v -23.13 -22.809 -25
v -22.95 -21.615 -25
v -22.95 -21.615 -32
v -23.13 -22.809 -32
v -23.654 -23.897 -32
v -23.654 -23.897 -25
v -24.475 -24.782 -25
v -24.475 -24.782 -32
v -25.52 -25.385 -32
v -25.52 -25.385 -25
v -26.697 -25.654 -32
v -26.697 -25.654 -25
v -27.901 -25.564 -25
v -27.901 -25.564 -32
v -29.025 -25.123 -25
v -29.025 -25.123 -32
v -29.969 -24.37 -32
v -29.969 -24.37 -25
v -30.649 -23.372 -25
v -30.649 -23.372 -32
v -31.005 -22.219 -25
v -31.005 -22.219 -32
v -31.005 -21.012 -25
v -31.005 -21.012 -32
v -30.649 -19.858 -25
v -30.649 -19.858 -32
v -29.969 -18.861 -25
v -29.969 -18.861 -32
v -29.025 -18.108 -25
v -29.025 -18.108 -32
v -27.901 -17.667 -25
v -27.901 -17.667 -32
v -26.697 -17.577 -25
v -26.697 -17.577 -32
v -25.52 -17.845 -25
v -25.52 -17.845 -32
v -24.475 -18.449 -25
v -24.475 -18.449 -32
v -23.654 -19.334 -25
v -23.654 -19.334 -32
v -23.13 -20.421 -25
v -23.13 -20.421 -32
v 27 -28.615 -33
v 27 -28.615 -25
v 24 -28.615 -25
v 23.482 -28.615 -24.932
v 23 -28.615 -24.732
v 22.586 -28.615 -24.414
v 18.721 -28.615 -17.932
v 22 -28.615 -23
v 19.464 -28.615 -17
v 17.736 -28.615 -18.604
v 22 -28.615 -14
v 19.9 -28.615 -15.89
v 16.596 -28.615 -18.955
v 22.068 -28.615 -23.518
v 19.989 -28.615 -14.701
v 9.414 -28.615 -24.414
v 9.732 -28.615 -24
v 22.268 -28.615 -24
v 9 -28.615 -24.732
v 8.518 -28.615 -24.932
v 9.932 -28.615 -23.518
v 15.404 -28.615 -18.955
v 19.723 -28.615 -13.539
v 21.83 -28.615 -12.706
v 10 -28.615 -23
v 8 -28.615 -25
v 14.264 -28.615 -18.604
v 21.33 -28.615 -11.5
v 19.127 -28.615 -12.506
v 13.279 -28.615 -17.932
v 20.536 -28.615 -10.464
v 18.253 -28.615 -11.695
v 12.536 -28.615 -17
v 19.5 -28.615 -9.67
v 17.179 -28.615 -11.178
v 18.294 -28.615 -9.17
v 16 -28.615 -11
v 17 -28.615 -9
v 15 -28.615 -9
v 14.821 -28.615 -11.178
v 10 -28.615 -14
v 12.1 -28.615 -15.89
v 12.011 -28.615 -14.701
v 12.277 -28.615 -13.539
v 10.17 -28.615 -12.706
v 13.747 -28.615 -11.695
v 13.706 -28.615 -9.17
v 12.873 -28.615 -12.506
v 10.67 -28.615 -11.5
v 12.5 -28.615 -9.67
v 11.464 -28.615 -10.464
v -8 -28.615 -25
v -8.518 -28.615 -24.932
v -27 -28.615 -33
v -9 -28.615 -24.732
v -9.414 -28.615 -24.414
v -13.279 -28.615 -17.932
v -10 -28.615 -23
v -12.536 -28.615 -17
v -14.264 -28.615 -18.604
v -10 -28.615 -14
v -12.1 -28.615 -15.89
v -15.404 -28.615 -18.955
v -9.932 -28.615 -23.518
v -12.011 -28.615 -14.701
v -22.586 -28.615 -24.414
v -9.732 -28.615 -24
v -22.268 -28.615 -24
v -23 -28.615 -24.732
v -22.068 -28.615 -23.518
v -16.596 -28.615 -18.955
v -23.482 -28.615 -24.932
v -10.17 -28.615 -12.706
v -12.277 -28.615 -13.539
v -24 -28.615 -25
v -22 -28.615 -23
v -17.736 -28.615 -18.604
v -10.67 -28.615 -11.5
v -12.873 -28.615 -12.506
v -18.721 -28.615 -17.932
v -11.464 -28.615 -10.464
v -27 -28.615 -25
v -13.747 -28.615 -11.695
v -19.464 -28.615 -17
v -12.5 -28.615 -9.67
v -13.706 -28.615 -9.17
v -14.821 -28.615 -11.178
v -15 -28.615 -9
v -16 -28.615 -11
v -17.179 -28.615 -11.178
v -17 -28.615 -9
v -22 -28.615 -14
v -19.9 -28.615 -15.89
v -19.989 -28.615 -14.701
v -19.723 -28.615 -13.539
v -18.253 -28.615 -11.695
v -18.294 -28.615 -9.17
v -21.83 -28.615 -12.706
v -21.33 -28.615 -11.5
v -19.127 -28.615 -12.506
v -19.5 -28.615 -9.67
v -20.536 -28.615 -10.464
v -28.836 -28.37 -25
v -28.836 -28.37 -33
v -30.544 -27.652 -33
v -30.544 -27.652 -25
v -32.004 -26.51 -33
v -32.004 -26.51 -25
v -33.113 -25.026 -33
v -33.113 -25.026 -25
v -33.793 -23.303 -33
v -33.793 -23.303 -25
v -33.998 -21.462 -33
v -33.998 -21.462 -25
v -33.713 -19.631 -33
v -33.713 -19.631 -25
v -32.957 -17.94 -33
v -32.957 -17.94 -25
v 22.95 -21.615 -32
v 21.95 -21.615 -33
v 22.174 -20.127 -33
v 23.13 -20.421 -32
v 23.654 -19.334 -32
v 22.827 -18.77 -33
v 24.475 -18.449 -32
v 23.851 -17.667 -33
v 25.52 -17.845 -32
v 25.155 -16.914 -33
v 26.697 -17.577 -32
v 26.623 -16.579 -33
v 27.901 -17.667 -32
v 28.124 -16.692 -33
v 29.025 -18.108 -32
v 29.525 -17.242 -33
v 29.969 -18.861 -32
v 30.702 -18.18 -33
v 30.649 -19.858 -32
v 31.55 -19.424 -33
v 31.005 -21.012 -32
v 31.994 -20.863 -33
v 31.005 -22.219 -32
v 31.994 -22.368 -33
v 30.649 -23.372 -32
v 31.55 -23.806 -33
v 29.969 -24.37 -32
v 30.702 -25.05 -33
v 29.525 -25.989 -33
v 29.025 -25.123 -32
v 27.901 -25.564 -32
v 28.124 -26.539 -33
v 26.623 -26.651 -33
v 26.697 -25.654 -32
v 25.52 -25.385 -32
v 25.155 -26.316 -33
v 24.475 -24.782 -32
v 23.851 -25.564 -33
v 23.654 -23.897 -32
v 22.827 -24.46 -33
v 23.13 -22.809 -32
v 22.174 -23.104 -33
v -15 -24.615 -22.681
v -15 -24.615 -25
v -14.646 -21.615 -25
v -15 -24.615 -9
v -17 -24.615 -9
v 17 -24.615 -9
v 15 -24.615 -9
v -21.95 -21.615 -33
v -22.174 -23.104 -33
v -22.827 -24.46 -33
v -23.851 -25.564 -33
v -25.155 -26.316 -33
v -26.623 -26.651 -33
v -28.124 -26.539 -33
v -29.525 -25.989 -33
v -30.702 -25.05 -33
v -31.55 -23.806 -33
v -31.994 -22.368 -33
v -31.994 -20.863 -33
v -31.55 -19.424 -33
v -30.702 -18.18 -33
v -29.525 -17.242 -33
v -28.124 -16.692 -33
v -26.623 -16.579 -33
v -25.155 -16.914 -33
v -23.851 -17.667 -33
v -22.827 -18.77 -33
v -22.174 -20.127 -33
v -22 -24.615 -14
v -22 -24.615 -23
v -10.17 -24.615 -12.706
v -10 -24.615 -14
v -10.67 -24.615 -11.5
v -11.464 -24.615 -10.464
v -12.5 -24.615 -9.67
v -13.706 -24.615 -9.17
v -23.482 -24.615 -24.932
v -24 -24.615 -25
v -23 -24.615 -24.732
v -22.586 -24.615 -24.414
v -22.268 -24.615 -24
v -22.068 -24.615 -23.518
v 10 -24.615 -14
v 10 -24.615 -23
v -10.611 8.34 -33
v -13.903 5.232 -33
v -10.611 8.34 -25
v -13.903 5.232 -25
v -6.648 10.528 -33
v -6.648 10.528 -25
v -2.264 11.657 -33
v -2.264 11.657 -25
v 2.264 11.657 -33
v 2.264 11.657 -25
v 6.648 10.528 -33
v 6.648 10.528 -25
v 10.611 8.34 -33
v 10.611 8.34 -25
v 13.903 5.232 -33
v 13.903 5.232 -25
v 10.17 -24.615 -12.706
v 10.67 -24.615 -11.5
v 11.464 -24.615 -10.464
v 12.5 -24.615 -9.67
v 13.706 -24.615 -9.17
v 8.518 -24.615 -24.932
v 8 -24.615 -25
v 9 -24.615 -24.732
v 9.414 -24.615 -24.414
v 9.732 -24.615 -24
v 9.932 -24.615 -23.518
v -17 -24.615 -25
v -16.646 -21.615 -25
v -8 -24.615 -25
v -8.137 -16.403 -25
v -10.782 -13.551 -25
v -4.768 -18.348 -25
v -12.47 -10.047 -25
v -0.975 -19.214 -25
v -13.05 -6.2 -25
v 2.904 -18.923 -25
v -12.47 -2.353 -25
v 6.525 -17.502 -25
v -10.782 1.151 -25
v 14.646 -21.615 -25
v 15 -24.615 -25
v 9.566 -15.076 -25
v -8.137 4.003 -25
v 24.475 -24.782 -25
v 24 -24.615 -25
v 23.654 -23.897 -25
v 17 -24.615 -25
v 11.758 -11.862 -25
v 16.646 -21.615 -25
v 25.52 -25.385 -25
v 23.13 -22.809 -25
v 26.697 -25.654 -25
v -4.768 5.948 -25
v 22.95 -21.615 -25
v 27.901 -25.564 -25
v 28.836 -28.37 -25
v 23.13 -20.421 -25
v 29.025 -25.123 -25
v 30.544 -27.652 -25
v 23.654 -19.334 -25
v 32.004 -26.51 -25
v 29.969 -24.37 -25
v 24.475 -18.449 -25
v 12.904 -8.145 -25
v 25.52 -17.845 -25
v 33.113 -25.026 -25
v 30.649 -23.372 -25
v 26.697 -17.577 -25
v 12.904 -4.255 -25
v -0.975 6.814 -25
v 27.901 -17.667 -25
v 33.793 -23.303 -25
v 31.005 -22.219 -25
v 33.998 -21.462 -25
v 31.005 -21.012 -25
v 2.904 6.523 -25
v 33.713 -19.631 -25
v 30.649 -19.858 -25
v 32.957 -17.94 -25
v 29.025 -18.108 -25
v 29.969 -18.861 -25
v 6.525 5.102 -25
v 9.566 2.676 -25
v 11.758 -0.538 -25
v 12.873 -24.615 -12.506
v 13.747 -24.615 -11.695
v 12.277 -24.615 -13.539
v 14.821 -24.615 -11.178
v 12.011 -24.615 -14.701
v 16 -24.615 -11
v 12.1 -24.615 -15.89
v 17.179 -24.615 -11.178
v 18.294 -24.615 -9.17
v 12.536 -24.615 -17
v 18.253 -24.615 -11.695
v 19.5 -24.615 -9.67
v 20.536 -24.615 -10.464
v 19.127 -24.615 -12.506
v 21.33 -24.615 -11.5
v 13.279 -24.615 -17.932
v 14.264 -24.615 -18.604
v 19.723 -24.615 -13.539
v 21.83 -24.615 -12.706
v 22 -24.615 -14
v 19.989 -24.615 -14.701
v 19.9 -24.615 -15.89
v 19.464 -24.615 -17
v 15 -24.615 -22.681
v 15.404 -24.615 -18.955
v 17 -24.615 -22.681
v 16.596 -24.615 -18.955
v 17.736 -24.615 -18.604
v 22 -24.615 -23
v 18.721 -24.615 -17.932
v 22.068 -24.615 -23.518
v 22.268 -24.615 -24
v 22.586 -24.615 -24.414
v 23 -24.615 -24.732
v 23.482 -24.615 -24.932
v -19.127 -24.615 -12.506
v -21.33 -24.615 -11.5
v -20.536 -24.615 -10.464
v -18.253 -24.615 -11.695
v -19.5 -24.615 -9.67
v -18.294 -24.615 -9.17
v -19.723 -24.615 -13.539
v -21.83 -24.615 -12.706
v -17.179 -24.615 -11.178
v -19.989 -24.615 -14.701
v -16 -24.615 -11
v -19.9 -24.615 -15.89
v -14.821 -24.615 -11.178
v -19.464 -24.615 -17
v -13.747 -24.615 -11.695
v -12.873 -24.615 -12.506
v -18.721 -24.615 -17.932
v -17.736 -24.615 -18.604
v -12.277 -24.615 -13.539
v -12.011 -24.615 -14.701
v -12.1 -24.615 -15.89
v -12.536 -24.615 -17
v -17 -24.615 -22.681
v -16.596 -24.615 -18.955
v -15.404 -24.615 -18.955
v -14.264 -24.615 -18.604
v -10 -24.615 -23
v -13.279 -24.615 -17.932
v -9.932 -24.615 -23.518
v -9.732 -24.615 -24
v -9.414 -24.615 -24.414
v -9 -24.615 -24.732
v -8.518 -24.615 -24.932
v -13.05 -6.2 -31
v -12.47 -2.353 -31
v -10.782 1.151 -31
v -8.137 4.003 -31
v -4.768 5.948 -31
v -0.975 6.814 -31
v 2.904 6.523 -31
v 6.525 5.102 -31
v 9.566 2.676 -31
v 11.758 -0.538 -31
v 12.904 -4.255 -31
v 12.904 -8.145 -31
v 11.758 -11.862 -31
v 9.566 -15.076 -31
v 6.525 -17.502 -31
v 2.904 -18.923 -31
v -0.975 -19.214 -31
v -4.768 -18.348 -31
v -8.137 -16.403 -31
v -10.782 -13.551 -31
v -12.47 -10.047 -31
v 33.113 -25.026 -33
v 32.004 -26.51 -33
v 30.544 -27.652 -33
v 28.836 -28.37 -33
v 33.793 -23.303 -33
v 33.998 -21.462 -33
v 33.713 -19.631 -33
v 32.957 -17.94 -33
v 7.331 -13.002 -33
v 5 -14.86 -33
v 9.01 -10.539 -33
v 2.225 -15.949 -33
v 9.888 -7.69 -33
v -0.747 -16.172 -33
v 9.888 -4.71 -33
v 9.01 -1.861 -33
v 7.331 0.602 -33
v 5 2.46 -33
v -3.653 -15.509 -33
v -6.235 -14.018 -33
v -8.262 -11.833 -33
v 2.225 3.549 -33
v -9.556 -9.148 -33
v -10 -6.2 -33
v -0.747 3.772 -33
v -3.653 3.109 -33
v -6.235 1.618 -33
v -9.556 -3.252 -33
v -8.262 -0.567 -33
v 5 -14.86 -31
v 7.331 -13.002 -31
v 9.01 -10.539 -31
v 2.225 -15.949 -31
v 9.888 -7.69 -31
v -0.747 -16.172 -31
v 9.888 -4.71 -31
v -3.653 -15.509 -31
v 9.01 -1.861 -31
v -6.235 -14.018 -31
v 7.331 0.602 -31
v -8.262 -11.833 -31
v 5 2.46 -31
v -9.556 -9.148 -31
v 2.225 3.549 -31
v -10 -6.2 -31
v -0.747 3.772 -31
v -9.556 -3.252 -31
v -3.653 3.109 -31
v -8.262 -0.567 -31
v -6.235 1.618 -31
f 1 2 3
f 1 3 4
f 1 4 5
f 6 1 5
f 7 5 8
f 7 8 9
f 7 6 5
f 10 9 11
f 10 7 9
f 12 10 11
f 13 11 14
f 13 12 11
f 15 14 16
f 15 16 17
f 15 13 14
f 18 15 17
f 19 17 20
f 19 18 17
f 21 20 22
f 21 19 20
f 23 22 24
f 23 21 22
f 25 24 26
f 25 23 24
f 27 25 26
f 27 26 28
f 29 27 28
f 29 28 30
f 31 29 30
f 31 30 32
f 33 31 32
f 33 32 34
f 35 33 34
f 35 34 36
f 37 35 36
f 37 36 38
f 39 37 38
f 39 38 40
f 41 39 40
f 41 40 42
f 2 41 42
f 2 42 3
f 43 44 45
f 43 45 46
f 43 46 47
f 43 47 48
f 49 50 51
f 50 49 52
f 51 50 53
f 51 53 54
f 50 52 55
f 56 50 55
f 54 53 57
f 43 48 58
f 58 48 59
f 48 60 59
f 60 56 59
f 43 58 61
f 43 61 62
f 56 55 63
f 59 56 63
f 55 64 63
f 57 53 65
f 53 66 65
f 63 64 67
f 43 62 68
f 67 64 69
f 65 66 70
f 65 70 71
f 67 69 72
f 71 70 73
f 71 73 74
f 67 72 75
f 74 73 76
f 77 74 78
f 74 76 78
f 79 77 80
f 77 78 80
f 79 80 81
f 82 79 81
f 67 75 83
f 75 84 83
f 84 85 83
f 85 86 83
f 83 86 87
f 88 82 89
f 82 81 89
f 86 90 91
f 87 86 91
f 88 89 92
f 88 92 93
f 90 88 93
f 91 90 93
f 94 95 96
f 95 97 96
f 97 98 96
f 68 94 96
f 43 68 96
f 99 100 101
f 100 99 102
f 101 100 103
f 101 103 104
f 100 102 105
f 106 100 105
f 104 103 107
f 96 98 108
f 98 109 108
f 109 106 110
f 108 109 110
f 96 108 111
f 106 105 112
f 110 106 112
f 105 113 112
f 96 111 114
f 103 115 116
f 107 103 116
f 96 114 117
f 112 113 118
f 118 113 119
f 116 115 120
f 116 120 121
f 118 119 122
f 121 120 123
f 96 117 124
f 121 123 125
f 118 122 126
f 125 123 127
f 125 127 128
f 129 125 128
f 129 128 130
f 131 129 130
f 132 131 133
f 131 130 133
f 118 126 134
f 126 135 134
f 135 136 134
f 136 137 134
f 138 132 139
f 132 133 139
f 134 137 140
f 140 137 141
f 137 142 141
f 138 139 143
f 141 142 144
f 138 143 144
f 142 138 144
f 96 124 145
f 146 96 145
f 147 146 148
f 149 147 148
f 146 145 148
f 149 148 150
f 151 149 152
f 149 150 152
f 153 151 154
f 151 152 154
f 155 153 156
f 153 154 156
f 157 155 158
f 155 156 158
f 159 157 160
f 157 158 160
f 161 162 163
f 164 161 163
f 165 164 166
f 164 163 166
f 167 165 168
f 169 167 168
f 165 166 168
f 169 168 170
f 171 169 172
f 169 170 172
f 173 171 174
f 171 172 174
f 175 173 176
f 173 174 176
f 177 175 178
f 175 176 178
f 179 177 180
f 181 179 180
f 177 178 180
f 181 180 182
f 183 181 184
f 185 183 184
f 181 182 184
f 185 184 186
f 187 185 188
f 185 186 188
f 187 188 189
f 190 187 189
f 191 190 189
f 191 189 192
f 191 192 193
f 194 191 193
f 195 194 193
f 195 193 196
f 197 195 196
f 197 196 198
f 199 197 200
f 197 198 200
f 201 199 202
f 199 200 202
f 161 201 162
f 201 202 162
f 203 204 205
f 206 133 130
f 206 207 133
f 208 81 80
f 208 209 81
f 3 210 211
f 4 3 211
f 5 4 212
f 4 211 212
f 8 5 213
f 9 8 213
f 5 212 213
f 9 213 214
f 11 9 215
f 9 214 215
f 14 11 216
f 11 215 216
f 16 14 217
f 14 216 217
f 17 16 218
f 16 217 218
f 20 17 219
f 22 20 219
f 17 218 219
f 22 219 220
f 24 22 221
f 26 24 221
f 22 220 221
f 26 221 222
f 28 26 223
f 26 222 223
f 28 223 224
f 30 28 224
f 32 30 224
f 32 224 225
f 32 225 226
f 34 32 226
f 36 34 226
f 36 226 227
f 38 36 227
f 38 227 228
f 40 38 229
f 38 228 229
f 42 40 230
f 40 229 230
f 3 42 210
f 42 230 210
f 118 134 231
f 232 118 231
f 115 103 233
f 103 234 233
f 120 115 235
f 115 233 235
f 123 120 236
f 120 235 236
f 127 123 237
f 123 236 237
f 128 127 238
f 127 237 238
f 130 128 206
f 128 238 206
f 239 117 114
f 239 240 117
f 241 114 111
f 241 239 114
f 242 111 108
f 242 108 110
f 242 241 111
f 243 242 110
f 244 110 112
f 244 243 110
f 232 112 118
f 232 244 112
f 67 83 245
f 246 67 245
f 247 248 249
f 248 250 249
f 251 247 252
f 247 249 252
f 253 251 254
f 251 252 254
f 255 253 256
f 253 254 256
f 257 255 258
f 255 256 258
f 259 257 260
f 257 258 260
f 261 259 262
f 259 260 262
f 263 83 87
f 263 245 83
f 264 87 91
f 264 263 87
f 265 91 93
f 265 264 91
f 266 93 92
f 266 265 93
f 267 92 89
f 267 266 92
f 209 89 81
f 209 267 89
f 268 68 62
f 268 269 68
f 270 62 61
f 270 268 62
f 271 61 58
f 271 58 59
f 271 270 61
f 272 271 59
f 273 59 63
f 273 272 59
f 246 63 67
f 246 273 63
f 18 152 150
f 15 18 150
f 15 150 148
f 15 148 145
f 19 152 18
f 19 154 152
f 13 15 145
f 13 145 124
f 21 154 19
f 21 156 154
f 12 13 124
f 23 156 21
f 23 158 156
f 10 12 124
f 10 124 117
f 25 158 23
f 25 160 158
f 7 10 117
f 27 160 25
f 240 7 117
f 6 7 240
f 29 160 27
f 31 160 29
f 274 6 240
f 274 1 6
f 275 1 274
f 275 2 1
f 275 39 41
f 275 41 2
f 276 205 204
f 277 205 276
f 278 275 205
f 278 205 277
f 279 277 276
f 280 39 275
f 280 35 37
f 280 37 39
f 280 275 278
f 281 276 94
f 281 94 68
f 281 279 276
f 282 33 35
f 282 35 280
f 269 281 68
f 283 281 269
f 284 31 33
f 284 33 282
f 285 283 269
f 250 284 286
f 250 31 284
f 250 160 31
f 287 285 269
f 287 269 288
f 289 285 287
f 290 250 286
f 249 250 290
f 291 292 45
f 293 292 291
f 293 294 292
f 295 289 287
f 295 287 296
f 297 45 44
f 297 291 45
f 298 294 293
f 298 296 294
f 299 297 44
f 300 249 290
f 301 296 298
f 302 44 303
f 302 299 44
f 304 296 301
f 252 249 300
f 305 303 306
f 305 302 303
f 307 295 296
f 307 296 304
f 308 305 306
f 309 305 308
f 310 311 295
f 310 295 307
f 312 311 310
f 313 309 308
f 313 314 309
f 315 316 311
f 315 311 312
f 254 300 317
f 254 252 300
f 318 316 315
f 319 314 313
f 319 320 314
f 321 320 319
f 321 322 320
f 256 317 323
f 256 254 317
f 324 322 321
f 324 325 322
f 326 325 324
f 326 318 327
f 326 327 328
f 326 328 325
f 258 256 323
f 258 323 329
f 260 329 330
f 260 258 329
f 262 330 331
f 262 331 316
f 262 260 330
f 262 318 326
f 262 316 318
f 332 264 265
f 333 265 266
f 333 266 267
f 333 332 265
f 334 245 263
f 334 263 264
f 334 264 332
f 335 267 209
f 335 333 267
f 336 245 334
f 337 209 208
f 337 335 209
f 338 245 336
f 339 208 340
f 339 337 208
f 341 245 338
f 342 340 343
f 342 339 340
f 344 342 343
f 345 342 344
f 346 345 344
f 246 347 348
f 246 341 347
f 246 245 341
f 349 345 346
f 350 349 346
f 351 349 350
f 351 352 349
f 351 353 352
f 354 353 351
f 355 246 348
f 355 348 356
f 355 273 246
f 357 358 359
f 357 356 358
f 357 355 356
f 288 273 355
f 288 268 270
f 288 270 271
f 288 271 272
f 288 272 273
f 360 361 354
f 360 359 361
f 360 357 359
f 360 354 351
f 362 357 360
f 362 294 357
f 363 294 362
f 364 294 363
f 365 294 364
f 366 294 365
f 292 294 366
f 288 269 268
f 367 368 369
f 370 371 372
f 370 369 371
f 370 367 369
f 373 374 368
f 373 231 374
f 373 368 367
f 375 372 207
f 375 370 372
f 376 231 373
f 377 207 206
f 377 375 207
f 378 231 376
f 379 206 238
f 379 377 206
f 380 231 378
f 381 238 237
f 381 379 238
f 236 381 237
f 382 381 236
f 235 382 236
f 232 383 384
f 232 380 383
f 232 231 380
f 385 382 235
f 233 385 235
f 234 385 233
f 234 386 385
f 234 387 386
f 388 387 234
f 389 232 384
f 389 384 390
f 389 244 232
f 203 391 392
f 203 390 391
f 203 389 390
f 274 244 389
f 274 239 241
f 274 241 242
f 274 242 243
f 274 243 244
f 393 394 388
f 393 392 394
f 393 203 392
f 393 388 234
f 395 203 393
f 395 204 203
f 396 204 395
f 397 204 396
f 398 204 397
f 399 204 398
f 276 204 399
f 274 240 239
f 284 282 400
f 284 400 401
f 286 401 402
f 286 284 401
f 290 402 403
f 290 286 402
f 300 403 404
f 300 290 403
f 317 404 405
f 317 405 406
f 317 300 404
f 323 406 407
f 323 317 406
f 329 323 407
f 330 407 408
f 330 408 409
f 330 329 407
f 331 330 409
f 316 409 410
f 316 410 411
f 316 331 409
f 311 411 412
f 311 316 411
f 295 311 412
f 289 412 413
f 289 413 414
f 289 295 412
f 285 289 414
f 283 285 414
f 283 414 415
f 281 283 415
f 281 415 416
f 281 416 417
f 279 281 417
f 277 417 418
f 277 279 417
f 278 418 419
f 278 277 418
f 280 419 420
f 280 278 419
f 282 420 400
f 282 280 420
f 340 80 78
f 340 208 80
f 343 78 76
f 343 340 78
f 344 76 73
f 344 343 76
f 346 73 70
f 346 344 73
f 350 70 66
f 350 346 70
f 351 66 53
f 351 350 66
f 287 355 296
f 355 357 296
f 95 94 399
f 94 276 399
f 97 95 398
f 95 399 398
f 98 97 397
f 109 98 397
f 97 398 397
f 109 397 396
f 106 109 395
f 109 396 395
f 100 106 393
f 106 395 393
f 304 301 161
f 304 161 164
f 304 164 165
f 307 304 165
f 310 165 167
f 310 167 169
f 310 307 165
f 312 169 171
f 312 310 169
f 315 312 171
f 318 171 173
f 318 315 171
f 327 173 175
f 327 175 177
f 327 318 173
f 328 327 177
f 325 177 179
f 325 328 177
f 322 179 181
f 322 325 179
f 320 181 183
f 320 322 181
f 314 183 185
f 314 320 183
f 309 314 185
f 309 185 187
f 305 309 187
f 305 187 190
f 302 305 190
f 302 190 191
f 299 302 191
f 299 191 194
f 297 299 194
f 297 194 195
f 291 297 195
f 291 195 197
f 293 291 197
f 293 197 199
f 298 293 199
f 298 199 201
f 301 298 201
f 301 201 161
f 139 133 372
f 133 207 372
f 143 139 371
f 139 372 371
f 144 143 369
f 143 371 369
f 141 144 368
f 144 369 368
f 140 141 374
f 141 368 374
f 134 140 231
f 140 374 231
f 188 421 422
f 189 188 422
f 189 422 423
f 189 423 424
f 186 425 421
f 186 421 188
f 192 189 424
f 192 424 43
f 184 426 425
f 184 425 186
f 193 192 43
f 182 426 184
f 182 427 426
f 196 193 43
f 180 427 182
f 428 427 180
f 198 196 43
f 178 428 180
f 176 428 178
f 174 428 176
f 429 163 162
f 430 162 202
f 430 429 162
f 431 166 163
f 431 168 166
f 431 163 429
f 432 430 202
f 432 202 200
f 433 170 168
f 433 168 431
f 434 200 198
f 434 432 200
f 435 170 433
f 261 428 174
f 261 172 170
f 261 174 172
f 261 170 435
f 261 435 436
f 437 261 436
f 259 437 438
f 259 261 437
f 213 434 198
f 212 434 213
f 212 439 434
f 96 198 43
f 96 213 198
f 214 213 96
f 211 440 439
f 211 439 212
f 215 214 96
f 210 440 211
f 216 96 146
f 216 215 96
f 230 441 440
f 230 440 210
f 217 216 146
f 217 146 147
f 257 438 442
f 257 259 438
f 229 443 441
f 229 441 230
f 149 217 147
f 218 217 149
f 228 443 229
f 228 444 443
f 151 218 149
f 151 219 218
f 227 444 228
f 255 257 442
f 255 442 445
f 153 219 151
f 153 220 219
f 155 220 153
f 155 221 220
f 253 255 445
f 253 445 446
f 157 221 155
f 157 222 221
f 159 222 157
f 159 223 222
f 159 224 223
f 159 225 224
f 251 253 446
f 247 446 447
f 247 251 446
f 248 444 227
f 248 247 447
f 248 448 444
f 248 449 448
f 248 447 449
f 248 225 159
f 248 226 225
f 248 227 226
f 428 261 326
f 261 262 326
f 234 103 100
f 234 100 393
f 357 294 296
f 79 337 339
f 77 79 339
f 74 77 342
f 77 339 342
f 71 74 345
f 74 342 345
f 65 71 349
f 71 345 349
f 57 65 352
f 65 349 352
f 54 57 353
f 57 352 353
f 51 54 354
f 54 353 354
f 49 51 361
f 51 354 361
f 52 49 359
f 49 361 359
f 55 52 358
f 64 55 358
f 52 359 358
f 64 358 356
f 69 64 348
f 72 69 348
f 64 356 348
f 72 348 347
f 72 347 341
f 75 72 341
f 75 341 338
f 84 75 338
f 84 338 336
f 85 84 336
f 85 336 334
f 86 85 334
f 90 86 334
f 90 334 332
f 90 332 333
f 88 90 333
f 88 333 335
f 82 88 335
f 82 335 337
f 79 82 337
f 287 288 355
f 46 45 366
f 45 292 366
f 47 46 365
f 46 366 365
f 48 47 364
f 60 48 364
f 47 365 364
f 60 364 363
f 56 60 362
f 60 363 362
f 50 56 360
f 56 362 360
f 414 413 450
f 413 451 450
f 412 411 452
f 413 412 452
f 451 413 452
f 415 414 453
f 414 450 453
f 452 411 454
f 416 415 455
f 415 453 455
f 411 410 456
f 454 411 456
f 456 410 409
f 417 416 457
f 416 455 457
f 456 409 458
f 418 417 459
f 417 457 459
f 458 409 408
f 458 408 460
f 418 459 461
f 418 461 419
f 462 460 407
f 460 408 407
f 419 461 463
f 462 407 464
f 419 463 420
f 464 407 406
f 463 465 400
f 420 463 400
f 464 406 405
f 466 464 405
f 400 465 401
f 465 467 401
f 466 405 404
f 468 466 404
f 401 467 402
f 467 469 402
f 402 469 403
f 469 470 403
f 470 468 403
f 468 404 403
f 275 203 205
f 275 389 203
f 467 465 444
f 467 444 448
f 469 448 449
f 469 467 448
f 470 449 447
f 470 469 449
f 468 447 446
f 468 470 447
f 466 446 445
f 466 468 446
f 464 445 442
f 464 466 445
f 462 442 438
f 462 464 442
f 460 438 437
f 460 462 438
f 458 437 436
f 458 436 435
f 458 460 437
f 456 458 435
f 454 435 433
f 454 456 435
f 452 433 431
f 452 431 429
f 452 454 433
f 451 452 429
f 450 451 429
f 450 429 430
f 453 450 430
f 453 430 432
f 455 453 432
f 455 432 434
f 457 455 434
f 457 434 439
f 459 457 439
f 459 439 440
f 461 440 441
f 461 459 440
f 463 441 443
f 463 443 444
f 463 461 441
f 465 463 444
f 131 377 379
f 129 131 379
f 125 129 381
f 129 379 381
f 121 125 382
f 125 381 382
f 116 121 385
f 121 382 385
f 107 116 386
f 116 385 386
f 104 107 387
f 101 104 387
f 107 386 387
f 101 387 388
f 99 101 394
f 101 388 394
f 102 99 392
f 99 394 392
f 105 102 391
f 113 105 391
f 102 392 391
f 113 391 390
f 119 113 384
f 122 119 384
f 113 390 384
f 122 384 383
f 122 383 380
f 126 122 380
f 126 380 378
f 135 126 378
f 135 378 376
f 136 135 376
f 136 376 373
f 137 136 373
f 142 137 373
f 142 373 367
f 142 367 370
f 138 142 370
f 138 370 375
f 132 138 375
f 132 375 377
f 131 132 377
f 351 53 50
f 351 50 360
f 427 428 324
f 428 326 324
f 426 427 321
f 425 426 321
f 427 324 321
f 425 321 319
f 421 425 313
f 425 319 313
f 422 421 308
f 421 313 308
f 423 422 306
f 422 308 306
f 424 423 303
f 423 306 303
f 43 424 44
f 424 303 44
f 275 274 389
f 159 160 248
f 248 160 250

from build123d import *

# Parameters (mm, degrees)
SALIENTE_EXTRUIR1_DEPTH = 23
SALIENTE_EXTRUIR2_DEPTH = 2
CROQUIS3_W              = 74.8935
CROQUIS3_H              = 50
SALIENTE_EXTRUIR3_DEPTH = 2
CROQUIS4_R              = 4.05
SALIENTE_EXTRUIR4_DEPTH = 50
CHAFL_N2_SIZE           = 1
CROQUIS7_R              = 4.05
CROQUIS7_R_2            = 13.05
SALIENTE_EXTRUIR5_DEPTH = 6
CROQUIS8_W              = 12
CROQUIS8_H              = 4
SALIENTE_EXTRUIR6_DEPTH = 16
REDONDEO3_R             = 2
REDONDEO4_R             = 5
CROQUIS14_R             = 4
CORTAR_EXTRUIR1_DEPTH   = 10
SALIENTE_EXTRUIR7_DEPTH = 1
CROQUIS20_R             = 4.05
CROQUIS20_R_2           = 10
SALIENTE_EXTRUIR8_DEPTH = 2
CHAFL_N3_SIZE           = 1


with BuildPart() as part:
    # Croquis1 → Saliente-Extruir1 (new, symmetric)
    with BuildSketch(Plane.XY):
        Polygon((-7.48935, 0), (7.48935, 0), (0.00065, 21.6199), align=None)
    extrude(amount=SALIENTE_EXTRUIR1_DEPTH, both=True)

    # Croquis2 → Saliente-Extruir2 (add)
    with BuildSketch(Plane.XY.offset(23)):
        Polygon((37.44675, 0), (-37.44675, 0), (0.00065, 21.6199), align=None)
    saliente_extruir2 = extrude(amount=SALIENTE_EXTRUIR2_DEPTH)

    # Simetría1: Saliente-Extruir2 across plane
    add(saliente_extruir2.mirror(Plane.XY))

    # Croquis3 → Saliente-Extruir3 (add)
    with BuildSketch(Plane.XZ):
        Rectangle(CROQUIS3_W, CROQUIS3_H)
    extrude(amount=SALIENTE_EXTRUIR3_DEPTH)

    # Croquis4 → Saliente-Extruir4 (add)
    with BuildSketch(Plane.XY.offset(25)):
        with BuildLine():
            Line((7.743545699, -2), (-7.743545699, -2))
            ThreePointArc((-7.743545699, -2), (-6.147743753, -2.794422898), (-5.819683414, -4.546583851))
            ThreePointArc((-5.819683414, -4.546583851), (0, -12.25), (5.819683414, -4.546583851))
            ThreePointArc((5.819683414, -4.546583851), (6.147743753, -2.794422898), (7.743545699, -2))
        make_face()
        with Locations((0, -6.2)):
            Circle(CROQUIS4_R, mode=Mode.SUBTRACT)
    extrude(amount=-SALIENTE_EXTRUIR4_DEPTH)

    # Chaflán2
    chafl_n2_edges = [part.edges().sort_by_distance(p)[0] for p in [
        (-4.05, -6.2, -25),
        (-4.05, -6.2, 25),
    ]]
    chamfer(chafl_n2_edges, length=CHAFL_N2_SIZE)


with BuildPart() as body_2:
    # Croquis7 → Saliente-Extruir5 (new body)
    with BuildSketch(Plane(origin=(0, 0, -25), x_dir=(-1, 0, 0), z_dir=(0, 0, -1))):
        with BuildLine():
            Line((27, -28.615252187), (-27, -28.615252187))
            ThreePointArc((-27, -28.615252187), (-33.112686004, -25.026274001), (-32.957287229, -17.939557849))
            Line((-32.957287229, -17.939557849), (-13.903204494, 5.232449641))
            ThreePointArc((-13.903204494, 5.232449641), (0, 11.8), (13.903204494, 5.232449641))
            Line((13.903204494, 5.232449641), (32.957287229, -17.939557849))
            ThreePointArc((32.957287229, -17.939557849), (33.112686004, -25.026274001), (27, -28.615252187))
        make_face()
        with Locations((-27, -21.615252187)):
            Circle(CROQUIS7_R, mode=Mode.SUBTRACT)
        with Locations(Location((27, -21.615252187, 0), (0, 0, 180))):
            Circle(CROQUIS7_R, mode=Mode.SUBTRACT)
        with Locations((0, -6.2)):
            Circle(CROQUIS7_R_2, mode=Mode.SUBTRACT)
    extrude(amount=SALIENTE_EXTRUIR5_DEPTH)

    # Croquis8 → Saliente-Extruir6 (add)
    with BuildSketch(Plane.XY.offset(-25)):
        with Locations((-16, -26.615252187)):
            Rectangle(CROQUIS8_W, CROQUIS8_H)
        with Locations((16, -26.615252187)):
            Rectangle(CROQUIS8_W, CROQUIS8_H)
    extrude(amount=SALIENTE_EXTRUIR6_DEPTH)

    # Redondeo3
    redondeo3_edges = [body_2.edges().sort_by_distance(p)[0] for p in [
        (-22, -26.615252187, -25),
        (-10, -26.615252187, -25),
        (22, -26.615252187, -25),
        (10, -26.615252187, -25),
    ]]
    fillet(redondeo3_edges, radius=REDONDEO3_R)

    # Redondeo4
    redondeo4_edges = [body_2.edges().sort_by_distance(p)[0] for p in [
        (-22, -26.615252187, -9),
        (-10, -26.615252187, -9),
        (22, -26.615252187, -9),
        (10, -26.615252187, -9),
    ]]
    fillet(redondeo4_edges, radius=REDONDEO4_R)

    # Croquis14 → Cortar-Extruir1 (cut)
    with BuildSketch(Plane(origin=(0, -24.615252187, 0), x_dir=(1, 0, 0), z_dir=(0, 1, 0))):
        with Locations(Location((-16, 15, 0), (0, 0, 270))):
            Circle(CROQUIS14_R)
        with Locations(Location((16, 15, 0), (0, 0, 270))):
            Circle(CROQUIS14_R)
    extrude(amount=-CORTAR_EXTRUIR1_DEPTH, mode=Mode.SUBTRACT)

    # Croquis3D2 → Saliente-Extruir7 (add, symmetric, along a direction that is not the sketch's normal)
    with BuildSketch(Plane(origin=(-16, -24.615252187, -22.681195735), x_dir=(0.09307928640942055, 0.7877707078361105, -0.6088953590863595), z_dir=(-0.9930919098636288, 0.11733907517707019, 0))):
        Polygon((0, 0), (3.808214713, 0), (1.411909156, 1.839392768), align=None)
    saliente_extruir7 = extrude(amount=SALIENTE_EXTRUIR7_DEPTH, dir=(-1, 0, 0), both=True)

    # Simetría2: Saliente-Extruir7 across plane
    add(saliente_extruir7.mirror(Plane(origin=(0, 0, 0), x_dir=(0, 0, 1), z_dir=(1, 0, 0))))

    # Croquis20 → Saliente-Extruir8 (add)
    with BuildSketch(Plane(origin=(0, 0, -31), x_dir=(-1, 0, 0), z_dir=(0, 0, -1))):
        with BuildLine():
            Line((32.957287229, -17.939557849), (13.903204494, 5.232449641))
            ThreePointArc((13.903204494, 5.232449641), (0, 11.8), (-13.903204494, 5.232449641))
            Line((-13.903204494, 5.232449641), (-32.957287229, -17.939557849))
            ThreePointArc((-32.957287229, -17.939557849), (-33.112686004, -25.026274001), (-27, -28.615252187))
            Line((-27, -28.615252187), (27, -28.615252187))
            ThreePointArc((27, -28.615252187), (33.112686004, -25.026274001), (32.957287229, -17.939557849))
        make_face()
        with Locations((-27, -21.615252187)):
            Circle(CROQUIS20_R, mode=Mode.SUBTRACT)
        with Locations(Location((27, -21.615252187, 0), (0, 0, 180))):
            Circle(CROQUIS20_R, mode=Mode.SUBTRACT)
        with Locations((0, -6.2)):
            Circle(CROQUIS20_R_2, mode=Mode.SUBTRACT)
    extrude(amount=SALIENTE_EXTRUIR8_DEPTH)

    # Chaflán3
    chafl_n3_edges = [body_2.edges().sort_by_distance(p)[0] for p in [
        (31.05, -21.615252187, -33),
        (-31.05, -21.615252187, -33),
    ]]
    chamfer(chafl_n3_edges, length=CHAFL_N3_SIZE)


solid = body_2.part
